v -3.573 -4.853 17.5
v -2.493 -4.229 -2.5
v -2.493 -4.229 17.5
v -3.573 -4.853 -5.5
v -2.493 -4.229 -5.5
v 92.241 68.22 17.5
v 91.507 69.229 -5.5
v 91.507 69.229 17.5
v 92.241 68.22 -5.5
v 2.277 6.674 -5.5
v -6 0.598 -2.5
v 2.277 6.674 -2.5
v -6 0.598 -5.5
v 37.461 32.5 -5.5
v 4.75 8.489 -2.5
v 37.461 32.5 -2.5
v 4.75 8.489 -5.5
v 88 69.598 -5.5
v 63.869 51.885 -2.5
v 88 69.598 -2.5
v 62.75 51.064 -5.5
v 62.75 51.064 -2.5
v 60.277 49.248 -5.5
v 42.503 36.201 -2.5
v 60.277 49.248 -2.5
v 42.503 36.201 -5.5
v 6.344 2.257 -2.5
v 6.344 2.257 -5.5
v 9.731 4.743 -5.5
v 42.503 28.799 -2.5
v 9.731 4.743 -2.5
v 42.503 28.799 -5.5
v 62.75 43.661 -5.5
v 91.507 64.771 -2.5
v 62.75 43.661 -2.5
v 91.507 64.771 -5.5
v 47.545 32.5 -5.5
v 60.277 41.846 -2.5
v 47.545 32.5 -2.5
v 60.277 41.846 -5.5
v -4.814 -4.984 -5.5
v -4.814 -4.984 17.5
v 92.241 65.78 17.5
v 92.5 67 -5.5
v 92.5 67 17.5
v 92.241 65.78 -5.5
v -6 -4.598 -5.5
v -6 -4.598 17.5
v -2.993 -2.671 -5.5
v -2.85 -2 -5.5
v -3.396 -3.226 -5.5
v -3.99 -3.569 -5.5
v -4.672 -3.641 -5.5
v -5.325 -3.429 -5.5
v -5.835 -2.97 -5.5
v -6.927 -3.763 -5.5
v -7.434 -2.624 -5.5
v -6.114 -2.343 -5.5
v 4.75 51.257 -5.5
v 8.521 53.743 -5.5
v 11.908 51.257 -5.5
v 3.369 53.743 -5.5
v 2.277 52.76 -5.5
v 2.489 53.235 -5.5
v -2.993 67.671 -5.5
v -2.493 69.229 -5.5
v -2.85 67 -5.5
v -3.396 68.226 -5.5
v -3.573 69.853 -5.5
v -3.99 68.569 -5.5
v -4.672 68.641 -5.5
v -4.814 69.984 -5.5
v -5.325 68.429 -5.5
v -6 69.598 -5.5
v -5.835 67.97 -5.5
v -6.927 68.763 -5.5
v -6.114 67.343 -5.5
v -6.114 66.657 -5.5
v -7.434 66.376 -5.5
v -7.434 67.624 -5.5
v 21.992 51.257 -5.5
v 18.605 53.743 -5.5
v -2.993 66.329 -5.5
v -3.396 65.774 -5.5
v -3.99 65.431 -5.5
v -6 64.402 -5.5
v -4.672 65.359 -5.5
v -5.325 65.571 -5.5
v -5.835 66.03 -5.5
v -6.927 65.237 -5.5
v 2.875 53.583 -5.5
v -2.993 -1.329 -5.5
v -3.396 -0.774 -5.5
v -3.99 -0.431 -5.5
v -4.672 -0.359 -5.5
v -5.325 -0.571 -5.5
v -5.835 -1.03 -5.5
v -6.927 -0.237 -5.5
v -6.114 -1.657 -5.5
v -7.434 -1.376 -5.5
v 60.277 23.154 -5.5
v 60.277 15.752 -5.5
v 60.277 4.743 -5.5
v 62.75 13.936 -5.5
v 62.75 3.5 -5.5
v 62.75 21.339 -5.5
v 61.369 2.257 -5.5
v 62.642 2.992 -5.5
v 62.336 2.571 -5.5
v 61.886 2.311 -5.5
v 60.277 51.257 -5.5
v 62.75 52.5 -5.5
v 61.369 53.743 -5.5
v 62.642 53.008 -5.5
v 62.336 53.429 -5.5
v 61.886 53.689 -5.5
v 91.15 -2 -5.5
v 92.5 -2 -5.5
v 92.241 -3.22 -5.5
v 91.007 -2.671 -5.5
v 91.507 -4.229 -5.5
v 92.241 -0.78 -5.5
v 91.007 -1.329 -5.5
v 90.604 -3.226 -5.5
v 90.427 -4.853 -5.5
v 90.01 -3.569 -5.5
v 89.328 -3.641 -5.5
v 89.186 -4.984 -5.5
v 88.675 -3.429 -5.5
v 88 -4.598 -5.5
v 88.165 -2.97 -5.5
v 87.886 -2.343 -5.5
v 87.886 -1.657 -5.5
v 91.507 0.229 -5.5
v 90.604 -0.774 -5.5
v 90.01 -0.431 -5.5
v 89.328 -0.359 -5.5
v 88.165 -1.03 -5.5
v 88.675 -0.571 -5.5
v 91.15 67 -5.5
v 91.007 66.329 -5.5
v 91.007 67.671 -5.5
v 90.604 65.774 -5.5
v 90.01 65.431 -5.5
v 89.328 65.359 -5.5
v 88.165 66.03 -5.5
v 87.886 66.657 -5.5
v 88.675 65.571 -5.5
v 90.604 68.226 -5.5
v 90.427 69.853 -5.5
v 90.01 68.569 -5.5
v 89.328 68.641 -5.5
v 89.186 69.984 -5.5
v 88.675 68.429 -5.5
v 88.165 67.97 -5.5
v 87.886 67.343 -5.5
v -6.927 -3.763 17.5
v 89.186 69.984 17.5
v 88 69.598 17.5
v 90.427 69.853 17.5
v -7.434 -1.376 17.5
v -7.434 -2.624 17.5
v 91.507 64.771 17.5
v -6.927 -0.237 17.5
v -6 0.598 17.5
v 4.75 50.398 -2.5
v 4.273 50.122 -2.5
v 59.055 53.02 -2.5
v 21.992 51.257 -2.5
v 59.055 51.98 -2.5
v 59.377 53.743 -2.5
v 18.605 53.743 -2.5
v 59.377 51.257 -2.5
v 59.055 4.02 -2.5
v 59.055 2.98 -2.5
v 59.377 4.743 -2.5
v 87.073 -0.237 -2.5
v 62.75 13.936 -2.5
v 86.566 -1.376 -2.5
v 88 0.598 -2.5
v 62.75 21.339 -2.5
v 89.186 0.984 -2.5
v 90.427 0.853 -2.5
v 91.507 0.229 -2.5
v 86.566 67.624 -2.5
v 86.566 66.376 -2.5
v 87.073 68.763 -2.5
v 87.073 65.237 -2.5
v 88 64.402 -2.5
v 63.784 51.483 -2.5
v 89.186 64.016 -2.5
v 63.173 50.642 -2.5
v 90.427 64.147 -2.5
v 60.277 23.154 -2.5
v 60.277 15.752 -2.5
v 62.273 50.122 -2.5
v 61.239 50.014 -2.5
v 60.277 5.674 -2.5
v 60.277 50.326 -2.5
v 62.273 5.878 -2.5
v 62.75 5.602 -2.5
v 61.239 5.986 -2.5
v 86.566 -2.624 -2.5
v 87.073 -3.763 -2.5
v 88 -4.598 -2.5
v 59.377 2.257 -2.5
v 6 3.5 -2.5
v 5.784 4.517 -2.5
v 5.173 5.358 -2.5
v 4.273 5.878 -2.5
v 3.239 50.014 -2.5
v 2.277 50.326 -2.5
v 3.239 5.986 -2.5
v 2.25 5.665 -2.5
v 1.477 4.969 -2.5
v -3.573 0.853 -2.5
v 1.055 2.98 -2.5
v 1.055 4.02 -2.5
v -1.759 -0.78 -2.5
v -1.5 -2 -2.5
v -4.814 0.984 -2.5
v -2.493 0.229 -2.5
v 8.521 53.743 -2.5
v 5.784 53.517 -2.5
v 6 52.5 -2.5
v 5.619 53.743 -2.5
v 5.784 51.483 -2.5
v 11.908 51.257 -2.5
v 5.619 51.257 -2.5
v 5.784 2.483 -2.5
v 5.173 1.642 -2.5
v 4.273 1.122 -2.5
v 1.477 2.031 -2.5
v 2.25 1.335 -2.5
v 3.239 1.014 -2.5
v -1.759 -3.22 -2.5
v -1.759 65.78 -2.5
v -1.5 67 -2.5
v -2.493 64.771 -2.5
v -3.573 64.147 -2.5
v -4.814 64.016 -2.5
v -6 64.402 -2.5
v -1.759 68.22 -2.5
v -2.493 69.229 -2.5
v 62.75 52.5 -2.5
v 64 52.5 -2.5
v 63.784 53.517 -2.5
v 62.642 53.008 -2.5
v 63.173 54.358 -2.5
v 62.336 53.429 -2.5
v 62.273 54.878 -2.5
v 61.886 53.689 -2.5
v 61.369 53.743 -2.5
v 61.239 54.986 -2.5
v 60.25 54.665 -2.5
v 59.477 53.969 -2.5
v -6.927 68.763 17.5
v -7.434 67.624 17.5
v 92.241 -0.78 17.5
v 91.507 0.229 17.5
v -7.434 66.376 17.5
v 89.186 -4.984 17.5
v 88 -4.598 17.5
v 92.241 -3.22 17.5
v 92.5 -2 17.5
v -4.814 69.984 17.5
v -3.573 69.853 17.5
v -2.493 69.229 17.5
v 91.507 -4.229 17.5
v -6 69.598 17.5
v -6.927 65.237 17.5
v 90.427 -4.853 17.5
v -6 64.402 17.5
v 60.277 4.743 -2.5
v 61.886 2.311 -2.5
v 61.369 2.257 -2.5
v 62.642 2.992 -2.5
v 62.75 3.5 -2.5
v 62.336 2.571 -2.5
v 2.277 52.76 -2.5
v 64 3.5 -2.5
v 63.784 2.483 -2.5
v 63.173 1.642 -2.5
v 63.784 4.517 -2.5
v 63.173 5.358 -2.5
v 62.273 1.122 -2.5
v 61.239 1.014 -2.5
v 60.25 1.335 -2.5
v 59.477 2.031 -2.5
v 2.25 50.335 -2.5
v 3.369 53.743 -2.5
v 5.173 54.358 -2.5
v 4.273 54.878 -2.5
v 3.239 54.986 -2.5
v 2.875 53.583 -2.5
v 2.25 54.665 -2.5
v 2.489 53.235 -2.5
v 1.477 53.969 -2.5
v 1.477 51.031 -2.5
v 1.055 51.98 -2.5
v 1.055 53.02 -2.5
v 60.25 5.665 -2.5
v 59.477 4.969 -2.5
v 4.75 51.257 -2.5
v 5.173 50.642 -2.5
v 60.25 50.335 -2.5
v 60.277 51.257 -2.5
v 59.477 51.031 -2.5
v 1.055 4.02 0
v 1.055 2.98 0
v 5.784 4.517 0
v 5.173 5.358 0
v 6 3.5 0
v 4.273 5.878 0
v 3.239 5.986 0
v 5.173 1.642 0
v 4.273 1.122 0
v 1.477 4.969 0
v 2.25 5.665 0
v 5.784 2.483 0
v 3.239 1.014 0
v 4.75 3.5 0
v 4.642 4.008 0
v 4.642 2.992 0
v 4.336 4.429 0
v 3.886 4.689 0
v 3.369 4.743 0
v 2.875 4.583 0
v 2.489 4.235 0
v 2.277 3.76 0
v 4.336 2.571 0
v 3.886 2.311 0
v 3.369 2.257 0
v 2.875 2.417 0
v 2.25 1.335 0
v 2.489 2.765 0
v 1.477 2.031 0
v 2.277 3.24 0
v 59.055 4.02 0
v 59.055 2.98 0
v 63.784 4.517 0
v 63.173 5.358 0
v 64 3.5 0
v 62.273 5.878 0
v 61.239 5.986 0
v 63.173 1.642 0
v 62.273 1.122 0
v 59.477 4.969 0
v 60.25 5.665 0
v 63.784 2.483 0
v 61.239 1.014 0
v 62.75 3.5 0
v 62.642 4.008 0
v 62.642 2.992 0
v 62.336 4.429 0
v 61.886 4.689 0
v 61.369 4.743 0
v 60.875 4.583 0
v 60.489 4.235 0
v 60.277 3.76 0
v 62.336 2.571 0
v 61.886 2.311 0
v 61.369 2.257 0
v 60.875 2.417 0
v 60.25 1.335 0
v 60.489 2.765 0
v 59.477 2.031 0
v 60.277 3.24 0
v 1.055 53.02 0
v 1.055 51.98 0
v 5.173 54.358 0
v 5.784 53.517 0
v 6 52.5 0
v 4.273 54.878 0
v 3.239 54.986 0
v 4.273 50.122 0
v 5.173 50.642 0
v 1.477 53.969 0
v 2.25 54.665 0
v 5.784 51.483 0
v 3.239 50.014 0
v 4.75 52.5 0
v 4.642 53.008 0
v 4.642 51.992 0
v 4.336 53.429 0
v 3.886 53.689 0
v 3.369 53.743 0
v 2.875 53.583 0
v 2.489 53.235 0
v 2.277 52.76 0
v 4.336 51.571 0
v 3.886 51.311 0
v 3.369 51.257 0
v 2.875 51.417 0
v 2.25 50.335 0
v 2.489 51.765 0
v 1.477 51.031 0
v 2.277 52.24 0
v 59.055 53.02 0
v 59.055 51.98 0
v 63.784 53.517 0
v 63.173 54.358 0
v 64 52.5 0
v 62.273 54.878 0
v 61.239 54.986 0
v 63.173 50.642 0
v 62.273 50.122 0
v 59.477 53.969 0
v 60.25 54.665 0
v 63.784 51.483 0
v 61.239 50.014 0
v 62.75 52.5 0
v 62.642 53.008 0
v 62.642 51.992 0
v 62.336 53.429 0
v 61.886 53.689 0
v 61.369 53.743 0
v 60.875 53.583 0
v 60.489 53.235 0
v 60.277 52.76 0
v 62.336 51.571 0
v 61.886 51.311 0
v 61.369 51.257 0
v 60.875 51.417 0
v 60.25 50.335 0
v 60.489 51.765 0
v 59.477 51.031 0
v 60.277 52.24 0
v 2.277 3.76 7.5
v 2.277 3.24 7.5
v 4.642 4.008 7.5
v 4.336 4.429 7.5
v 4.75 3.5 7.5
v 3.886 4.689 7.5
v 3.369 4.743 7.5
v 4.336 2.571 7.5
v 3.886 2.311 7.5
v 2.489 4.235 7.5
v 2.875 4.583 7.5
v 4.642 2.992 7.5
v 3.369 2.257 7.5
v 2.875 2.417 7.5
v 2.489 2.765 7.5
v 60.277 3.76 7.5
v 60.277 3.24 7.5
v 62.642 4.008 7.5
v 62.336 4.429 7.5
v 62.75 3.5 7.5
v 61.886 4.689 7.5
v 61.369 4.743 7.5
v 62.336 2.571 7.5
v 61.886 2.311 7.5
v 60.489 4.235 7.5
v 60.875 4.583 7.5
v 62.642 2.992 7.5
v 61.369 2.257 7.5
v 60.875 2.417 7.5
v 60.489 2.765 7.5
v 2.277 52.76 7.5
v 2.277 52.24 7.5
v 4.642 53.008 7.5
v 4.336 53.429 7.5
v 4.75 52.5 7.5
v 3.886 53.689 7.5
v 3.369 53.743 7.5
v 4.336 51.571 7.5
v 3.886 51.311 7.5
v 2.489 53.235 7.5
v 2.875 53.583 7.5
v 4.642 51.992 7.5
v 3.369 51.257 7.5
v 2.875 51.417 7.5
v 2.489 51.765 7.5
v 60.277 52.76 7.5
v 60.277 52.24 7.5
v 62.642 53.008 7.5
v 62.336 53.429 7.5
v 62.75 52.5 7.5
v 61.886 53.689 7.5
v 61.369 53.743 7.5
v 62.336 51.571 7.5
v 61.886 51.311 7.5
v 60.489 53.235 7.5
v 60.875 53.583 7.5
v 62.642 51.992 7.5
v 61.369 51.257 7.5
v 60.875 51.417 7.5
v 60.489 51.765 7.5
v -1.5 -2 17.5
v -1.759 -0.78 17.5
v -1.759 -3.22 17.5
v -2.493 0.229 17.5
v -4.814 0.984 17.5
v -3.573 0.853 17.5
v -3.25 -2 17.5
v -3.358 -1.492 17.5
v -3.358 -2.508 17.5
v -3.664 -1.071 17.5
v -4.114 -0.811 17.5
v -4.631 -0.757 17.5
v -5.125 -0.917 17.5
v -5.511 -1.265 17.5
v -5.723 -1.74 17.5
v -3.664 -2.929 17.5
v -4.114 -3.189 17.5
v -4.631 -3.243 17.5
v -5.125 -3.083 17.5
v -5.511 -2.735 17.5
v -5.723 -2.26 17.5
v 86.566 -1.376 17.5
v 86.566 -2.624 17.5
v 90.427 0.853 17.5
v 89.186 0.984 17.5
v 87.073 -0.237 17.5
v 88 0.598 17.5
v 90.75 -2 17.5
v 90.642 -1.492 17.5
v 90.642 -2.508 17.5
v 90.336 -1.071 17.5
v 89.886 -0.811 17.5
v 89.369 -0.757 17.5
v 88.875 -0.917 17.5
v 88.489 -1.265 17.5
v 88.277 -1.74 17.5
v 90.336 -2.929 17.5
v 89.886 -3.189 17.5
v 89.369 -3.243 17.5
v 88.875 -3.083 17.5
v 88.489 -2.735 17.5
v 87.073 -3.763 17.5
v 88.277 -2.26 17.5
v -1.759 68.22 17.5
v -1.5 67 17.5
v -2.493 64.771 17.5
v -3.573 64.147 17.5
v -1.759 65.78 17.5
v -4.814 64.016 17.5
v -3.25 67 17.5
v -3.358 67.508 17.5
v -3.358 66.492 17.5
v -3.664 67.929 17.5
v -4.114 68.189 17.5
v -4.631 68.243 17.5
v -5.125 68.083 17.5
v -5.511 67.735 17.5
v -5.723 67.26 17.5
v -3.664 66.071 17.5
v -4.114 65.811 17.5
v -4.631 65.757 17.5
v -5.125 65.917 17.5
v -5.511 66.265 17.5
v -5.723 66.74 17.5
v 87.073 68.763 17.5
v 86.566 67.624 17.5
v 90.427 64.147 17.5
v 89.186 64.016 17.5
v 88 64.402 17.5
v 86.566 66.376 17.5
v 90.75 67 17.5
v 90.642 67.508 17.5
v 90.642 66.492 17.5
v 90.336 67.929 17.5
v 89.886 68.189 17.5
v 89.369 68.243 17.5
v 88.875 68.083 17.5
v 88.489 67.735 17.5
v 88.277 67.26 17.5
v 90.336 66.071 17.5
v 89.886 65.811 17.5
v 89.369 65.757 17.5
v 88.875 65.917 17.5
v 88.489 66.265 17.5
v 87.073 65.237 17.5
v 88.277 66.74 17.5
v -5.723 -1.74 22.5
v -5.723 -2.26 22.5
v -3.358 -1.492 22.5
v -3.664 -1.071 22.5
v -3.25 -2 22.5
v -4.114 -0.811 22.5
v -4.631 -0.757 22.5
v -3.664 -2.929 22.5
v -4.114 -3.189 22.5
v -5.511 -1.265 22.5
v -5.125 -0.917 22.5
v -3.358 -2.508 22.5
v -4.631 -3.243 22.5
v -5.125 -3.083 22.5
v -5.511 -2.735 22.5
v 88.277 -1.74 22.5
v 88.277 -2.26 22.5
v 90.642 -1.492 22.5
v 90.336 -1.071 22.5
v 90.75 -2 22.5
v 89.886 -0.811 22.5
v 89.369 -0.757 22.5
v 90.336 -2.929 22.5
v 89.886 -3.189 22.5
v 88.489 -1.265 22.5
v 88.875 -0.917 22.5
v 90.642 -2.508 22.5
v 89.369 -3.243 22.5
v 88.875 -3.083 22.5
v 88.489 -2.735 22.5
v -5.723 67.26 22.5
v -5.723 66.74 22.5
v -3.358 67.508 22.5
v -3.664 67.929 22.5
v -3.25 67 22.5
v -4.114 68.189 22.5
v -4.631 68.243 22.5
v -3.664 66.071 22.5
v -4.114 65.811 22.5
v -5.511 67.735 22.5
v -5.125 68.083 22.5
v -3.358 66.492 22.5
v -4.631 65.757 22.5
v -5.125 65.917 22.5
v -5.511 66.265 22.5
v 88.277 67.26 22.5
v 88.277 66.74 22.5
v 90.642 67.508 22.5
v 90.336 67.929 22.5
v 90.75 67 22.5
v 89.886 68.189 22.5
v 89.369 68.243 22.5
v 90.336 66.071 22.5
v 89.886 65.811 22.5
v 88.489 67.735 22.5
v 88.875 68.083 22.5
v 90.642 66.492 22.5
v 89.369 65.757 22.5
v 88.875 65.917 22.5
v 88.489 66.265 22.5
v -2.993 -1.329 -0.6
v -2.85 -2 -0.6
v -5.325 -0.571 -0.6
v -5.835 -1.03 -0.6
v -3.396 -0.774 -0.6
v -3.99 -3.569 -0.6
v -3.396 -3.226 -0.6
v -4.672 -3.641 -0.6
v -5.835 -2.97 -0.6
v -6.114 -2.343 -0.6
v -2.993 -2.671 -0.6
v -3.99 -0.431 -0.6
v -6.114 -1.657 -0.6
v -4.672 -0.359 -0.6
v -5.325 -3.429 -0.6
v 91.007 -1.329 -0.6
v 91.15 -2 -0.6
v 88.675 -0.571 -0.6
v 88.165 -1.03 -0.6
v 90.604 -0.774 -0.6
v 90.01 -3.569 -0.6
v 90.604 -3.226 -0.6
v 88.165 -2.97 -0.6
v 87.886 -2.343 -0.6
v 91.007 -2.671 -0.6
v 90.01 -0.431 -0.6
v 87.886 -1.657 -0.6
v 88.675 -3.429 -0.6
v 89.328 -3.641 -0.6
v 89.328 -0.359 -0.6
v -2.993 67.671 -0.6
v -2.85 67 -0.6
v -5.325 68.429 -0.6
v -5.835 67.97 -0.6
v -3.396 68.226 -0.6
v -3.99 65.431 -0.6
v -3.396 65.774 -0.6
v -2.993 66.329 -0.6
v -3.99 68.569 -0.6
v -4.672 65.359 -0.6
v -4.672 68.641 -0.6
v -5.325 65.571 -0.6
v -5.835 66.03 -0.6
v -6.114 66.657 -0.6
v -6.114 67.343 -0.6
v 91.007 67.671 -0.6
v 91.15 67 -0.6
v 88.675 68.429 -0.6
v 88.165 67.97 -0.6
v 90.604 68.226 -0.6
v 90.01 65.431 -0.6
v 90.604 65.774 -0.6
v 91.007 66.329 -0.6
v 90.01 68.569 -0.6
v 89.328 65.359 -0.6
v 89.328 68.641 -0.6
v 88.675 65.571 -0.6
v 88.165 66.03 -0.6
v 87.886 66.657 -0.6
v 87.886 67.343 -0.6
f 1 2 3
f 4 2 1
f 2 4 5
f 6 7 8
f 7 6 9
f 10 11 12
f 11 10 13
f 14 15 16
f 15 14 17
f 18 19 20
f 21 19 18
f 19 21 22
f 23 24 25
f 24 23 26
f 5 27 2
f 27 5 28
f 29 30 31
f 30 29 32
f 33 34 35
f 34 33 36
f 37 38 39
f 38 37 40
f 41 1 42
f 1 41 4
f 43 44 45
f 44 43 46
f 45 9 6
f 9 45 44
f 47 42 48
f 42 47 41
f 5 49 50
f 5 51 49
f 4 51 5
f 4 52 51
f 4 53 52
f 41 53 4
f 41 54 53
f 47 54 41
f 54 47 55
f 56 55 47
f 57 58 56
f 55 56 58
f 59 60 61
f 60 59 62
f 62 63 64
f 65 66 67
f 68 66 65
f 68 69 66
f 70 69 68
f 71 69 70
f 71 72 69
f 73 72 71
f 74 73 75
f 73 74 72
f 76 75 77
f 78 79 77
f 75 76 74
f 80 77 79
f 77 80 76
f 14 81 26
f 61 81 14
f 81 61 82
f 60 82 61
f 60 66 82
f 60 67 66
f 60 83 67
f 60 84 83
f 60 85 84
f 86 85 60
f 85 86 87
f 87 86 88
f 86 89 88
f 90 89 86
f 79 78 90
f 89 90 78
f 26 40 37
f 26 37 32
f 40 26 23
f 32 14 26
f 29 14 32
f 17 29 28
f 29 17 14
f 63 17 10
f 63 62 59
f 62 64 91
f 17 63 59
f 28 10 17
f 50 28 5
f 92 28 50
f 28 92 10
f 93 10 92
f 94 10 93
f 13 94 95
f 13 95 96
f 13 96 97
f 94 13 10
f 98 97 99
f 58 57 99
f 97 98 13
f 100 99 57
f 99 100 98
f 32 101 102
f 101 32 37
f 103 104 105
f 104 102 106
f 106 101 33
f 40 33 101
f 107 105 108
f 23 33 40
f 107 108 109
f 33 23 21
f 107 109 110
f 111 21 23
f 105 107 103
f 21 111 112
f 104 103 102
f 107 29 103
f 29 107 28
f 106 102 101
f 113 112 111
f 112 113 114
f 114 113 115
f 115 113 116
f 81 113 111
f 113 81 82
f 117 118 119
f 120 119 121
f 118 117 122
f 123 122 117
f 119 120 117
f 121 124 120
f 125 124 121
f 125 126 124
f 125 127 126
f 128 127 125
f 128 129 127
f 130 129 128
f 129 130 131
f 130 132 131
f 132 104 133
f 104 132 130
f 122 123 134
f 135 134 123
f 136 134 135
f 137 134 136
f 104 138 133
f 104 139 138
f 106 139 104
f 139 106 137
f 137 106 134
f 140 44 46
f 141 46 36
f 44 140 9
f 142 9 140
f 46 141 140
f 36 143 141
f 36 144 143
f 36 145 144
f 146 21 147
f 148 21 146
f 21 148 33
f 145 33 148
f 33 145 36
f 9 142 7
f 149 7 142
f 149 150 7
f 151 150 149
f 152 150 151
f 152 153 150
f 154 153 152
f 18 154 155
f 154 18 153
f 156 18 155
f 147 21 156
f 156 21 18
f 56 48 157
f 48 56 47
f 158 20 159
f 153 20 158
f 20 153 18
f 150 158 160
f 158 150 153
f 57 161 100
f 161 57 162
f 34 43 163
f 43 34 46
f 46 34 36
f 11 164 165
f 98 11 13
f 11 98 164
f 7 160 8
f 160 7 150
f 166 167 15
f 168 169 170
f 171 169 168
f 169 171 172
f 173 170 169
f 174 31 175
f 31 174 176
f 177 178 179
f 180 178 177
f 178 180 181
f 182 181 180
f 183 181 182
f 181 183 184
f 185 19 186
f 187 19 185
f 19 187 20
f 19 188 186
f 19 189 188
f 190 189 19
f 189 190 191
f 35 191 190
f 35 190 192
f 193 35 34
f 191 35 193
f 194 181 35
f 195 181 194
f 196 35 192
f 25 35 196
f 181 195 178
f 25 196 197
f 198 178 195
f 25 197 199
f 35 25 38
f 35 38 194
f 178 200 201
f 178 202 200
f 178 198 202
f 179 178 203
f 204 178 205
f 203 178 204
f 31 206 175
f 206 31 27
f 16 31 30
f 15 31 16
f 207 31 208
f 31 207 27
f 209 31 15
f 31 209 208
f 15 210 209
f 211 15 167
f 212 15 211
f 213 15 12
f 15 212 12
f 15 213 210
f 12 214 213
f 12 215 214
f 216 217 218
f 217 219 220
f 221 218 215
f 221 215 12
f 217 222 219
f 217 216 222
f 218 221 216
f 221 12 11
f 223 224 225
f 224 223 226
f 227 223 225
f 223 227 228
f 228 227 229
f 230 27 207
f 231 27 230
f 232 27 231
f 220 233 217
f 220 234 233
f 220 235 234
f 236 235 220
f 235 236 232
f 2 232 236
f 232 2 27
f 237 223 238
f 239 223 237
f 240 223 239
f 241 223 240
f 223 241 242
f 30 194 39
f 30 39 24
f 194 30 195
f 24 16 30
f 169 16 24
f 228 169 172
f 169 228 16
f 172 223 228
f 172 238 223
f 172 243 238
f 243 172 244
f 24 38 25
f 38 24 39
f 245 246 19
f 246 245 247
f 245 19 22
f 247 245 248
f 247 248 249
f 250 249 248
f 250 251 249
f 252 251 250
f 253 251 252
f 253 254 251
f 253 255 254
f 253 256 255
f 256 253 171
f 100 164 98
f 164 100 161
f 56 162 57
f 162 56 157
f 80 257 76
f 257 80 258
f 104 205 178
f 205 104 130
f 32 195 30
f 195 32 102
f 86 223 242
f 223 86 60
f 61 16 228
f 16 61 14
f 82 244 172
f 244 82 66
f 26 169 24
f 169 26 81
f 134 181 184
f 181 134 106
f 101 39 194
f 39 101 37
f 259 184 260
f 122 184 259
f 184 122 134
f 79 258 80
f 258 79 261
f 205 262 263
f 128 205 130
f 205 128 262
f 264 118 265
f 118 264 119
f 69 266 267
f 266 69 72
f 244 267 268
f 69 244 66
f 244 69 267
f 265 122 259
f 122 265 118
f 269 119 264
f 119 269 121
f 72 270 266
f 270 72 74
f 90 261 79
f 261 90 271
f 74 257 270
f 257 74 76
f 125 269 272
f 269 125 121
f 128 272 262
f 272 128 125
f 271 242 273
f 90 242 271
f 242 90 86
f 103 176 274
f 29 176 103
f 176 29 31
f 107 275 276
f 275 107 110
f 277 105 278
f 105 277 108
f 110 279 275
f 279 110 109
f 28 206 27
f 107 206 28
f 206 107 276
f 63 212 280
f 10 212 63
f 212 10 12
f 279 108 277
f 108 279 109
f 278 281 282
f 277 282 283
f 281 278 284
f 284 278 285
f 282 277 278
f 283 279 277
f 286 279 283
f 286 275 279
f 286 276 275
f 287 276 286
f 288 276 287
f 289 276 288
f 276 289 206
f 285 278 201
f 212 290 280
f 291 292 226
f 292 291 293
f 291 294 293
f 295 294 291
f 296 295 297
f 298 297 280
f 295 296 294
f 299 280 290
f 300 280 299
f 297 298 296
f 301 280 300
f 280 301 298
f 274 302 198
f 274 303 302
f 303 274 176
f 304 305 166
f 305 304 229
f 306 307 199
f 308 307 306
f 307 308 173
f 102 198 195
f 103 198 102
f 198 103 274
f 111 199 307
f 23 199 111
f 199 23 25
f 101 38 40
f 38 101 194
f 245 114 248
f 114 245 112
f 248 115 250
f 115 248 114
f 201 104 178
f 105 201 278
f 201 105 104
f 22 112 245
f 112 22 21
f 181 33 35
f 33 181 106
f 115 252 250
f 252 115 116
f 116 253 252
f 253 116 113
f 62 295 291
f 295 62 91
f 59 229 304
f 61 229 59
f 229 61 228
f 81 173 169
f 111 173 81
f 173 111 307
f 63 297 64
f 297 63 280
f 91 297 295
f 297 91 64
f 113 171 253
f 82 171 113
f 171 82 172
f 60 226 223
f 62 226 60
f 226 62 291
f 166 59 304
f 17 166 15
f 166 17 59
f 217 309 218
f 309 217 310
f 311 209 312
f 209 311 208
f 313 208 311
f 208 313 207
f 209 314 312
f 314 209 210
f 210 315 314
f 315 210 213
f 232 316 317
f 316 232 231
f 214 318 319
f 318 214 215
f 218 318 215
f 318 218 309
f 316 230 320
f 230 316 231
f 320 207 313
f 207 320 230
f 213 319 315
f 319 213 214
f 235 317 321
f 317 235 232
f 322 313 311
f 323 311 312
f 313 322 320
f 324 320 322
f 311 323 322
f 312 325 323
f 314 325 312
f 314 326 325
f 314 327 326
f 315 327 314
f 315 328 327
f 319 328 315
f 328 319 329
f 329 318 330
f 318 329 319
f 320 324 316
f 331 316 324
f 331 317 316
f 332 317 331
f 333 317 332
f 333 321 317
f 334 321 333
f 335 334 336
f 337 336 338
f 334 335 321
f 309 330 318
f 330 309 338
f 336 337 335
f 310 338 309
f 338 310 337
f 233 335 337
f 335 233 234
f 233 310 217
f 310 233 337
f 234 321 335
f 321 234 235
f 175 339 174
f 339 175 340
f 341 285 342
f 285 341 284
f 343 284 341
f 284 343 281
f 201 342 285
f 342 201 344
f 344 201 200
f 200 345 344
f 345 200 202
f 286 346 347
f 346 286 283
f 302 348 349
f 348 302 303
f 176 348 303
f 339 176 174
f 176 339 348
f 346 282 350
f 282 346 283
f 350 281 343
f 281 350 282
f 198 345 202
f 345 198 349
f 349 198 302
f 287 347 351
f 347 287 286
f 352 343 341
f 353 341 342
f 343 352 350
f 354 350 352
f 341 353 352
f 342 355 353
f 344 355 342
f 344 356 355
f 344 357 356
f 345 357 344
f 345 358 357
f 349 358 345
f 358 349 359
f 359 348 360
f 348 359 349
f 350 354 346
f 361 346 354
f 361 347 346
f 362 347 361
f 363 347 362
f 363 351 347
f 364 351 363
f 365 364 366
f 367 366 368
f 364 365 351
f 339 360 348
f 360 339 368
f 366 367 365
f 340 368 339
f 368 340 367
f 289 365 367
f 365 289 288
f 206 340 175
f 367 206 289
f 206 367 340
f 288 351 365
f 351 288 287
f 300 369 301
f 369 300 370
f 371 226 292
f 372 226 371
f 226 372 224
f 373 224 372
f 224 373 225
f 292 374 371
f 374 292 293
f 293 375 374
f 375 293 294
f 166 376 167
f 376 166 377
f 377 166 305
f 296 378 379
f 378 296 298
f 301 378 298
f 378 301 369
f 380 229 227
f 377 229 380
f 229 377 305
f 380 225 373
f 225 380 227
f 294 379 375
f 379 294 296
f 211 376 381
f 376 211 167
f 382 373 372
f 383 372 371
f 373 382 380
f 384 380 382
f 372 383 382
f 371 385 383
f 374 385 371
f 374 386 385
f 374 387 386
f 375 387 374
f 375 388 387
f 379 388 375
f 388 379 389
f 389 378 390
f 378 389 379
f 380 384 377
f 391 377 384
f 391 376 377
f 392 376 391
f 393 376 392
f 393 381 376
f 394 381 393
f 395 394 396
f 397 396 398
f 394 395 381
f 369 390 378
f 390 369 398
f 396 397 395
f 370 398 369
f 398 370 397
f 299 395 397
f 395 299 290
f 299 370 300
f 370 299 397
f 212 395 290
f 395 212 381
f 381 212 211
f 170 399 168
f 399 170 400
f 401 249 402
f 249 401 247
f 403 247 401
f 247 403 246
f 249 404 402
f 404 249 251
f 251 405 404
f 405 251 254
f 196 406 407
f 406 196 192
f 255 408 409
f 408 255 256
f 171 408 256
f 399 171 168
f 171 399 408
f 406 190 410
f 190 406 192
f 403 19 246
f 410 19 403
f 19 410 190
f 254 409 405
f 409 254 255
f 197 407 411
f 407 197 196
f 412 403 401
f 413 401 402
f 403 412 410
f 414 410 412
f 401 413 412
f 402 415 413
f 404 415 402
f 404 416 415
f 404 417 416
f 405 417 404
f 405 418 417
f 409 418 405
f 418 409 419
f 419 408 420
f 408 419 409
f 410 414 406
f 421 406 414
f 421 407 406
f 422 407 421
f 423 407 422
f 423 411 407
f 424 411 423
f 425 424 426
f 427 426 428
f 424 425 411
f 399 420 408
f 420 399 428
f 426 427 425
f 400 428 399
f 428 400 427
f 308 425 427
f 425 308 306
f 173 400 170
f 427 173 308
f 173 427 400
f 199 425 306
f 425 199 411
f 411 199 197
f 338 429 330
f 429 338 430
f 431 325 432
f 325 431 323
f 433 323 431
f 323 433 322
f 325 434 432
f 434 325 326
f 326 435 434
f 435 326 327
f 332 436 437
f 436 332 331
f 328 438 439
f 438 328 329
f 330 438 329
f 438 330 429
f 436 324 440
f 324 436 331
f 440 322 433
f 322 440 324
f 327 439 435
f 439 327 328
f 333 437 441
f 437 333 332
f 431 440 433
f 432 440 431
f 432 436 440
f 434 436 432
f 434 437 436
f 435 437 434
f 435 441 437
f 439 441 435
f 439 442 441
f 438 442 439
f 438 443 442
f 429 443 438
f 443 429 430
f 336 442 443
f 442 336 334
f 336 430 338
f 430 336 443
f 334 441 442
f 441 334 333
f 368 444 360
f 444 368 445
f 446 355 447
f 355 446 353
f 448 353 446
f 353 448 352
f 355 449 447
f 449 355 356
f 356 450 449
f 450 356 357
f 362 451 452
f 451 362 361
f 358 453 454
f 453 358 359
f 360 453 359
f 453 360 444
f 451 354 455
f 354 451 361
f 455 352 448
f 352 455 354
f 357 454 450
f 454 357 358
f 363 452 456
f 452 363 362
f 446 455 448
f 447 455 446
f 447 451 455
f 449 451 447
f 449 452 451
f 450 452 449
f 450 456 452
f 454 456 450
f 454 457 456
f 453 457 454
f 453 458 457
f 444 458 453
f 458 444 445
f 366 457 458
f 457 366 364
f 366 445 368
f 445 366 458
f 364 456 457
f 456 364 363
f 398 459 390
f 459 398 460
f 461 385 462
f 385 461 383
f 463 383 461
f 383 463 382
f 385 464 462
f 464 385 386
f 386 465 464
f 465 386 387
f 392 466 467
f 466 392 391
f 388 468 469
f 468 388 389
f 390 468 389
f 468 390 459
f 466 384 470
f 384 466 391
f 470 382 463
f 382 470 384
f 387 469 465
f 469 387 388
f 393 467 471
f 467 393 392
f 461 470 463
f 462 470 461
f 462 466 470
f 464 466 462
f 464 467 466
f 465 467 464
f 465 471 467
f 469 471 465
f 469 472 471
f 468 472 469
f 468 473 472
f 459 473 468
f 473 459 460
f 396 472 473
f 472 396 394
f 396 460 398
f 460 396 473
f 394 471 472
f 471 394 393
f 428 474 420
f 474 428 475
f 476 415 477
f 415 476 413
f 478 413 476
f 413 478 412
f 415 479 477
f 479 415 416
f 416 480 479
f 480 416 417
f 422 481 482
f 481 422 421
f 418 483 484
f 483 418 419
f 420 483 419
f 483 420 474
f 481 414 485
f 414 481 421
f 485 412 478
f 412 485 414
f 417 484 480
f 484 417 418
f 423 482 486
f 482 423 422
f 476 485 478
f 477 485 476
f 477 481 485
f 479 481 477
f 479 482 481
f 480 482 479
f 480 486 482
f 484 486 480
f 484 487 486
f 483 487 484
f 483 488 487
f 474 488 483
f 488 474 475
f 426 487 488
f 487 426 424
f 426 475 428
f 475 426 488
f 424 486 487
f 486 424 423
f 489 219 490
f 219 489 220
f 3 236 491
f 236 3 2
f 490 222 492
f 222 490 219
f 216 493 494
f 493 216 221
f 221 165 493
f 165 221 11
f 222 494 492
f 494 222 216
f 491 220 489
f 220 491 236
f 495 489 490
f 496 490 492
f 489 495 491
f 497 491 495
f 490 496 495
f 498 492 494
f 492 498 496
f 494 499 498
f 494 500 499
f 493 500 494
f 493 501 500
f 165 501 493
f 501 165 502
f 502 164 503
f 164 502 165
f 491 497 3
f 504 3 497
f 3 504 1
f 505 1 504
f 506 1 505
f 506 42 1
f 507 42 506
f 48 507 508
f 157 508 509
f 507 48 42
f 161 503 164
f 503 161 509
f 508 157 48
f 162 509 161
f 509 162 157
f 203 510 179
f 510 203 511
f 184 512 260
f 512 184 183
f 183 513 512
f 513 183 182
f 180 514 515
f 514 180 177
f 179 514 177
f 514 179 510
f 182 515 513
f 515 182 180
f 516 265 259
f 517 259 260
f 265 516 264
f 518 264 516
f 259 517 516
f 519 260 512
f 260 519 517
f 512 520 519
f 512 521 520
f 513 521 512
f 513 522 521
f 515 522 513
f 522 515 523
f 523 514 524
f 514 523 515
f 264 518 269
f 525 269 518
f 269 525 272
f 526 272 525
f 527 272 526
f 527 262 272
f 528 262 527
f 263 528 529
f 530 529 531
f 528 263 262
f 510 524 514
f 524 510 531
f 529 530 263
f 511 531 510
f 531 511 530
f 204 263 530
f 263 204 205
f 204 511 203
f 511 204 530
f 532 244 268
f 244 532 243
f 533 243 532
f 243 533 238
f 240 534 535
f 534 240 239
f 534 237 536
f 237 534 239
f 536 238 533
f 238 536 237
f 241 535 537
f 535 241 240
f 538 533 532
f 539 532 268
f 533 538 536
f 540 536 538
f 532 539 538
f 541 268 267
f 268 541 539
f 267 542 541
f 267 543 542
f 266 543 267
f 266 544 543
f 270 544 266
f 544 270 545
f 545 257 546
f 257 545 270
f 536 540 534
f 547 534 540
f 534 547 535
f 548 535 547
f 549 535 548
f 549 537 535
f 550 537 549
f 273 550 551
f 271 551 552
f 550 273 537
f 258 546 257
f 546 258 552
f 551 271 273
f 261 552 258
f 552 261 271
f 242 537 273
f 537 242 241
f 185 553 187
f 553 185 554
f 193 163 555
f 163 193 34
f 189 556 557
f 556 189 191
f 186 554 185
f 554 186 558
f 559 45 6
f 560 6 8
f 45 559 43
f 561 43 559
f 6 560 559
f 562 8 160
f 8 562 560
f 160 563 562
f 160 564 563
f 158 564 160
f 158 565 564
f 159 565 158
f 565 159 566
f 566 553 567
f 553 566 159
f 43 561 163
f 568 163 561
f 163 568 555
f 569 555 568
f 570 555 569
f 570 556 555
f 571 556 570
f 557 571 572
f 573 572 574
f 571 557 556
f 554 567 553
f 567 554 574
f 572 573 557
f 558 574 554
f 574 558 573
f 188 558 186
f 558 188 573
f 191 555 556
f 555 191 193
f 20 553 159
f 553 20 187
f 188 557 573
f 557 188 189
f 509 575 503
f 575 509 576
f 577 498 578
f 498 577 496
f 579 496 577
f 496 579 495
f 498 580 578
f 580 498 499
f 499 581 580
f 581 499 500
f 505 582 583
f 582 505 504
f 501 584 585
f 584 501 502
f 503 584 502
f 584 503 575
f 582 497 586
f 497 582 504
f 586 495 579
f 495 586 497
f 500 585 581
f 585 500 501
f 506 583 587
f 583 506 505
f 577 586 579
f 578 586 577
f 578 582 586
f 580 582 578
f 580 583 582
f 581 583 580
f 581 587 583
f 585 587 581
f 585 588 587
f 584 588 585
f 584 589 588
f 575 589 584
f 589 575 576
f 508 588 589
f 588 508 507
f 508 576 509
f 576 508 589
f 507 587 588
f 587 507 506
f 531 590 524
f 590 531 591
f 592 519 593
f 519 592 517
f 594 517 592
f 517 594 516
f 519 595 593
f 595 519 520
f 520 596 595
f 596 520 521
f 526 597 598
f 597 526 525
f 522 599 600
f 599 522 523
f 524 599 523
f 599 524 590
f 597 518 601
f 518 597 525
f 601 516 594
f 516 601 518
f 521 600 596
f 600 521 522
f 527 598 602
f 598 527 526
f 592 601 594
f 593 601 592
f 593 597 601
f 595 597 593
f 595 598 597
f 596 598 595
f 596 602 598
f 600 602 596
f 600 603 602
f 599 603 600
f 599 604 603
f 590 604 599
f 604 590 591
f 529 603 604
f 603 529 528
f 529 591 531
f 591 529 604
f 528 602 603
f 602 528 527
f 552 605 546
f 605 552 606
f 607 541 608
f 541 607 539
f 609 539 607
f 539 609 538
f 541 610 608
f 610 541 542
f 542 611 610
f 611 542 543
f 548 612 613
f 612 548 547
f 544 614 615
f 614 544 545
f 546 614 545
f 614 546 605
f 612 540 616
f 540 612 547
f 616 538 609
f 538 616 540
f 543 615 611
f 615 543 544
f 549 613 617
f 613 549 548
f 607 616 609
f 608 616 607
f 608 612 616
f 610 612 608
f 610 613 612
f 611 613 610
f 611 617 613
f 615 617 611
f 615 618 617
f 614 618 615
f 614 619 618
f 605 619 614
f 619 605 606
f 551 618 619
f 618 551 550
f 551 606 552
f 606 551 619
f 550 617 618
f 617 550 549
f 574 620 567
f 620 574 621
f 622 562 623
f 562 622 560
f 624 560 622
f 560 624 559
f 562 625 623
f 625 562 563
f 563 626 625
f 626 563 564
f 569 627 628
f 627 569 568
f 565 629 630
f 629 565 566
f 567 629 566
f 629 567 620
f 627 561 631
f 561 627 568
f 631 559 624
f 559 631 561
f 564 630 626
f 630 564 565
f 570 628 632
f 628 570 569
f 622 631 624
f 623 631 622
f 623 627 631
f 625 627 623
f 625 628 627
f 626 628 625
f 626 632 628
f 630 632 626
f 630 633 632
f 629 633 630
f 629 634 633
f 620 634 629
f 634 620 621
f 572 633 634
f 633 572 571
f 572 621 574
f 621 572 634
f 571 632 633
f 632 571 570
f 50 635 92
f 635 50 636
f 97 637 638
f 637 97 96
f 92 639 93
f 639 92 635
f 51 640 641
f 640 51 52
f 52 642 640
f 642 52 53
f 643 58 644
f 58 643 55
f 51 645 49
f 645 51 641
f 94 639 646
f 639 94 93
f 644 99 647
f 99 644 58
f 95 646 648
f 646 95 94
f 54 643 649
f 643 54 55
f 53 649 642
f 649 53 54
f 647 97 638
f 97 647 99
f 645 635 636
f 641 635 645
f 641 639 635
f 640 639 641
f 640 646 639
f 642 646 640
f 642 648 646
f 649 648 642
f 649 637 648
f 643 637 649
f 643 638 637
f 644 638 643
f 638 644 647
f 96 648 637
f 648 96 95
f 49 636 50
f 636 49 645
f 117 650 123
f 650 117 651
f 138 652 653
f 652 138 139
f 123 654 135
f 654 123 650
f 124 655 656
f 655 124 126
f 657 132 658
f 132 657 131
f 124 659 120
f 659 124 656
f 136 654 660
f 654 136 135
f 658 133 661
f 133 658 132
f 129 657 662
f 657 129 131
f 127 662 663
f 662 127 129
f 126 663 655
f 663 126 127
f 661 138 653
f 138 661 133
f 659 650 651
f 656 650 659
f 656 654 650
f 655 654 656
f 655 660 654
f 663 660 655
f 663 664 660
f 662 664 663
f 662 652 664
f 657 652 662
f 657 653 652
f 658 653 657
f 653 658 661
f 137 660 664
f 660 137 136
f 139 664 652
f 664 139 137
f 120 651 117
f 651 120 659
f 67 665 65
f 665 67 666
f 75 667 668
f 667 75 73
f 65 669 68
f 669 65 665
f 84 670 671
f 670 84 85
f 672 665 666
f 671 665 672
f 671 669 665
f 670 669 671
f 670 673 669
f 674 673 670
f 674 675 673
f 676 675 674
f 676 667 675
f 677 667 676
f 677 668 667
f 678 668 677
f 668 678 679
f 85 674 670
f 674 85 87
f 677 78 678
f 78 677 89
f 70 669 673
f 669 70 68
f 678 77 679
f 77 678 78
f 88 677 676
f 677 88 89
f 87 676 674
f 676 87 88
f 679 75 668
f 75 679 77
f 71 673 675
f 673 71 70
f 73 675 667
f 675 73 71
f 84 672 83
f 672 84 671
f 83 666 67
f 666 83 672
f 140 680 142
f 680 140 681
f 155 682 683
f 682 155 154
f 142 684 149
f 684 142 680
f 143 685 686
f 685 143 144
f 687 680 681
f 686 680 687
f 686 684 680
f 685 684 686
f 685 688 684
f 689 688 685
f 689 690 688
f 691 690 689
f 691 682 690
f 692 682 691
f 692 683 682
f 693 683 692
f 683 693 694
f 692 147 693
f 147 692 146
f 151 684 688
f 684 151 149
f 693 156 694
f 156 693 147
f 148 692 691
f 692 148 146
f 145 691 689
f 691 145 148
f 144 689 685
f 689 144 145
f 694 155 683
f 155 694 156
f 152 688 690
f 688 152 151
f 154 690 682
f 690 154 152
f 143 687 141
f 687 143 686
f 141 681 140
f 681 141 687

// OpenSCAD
// pi-like-stack
// Stack pi-like boards on top of one another
// 85mm x 56mm x 20mm
// Standoffs 2.5mm diameter

// BUG (openscad): https://github.com/openscad/openscad/issues/3098
// Customizer has poor support for float input.
// Workaround: ``my_parameter = 1.0 // .01``
// Or:  ``my_parameter = 1.0 // [0:0.1:2]``
// See: "Unavailable customizations"
// https://en.wikibooks.org/wiki/OpenSCAD_User_Manual/Customizer

// ----------------------------------------
// Parameters
// ----------------------------------------

$fn=15;

colour_a = [0.999, 0.999, 0.999];
colour_b = [0.42, 0.81, 0.39];

// Toggle board visiblity
board_enabled = true;

// Toggle case pillar connectors
case_minimal_enabled = true;
// Toggle case standoff connectors
case_board_connect_enabled = true;
// Toggle case slab
case_slab_enabled = false;
// Toggle hex air hole in case slab
case_slab_holes = false;

// Toggle standoff 1
standoff_1_enabled = true;
// Toggle standoff 2
standoff_2_enabled = true;
// Toggle standoff 3
standoff_3_enabled = true;
// Toggle standoff 4
standoff_4_enabled = true;

// Toggle pillars
pillars_enabled = true;

/* [Board] */

// Standard size pi-like
board_size = [85.0, 65.0, 20.0];
board_n=1;
// Half size pi-like
//board_size = [30, 65, 20];
// Duplicate board in X
//board_n=2;
// Board roundness
board_r = 3.0;  // .01

// Duplicate board gap
board_n_space = 10.0;  // .01

/* [Standoffs] */

// Standard size pi-like
// Standoff distance in X
standoff_x = 58.0;  // .01
// Standoff distance in Y
standoff_y = 49.0;  // .01

// Half size pi-like
//standoff_x = 23;  // .01
// Standoff distance in Y
//standoff_y = 58;  // .01

// Standoff height
standoff_z = 10.0;  // .01
// Standoff radius
standoff_r = 1.25;  // .01
// Standoff base radius
standoff_base_r = 2.5;  // .01
// Standoff base height
standoff_base_z = 2.5;  // .01
// Standoff distance from origin in X
standoff_offset_x = 3.5;  // .01
// Standoff distance from origin in Y
standoff_offset_y = 3.5;  // .01

/* [Case] */

// Case size in X
case_x = 100.0;  // .01
// Case size in Y
case_y = 75.0;  // .01
// Case thickness
case_z = 3.0;  // .01
// Case corner roundness
case_r = 3.0;  // .01
// Scale the air hole pattern if case slab and holes enabled
case_slab_hole_scale = 1.025;  // .01
case_slab_hole_offset = 1.0;  // .01


/* [Case pillars] */

pillar_h = 25.0;  // .01
pillar_r = 3.0;  // .01
pillar_offset_x = 6.0;  // .01
pillar_offset_y = 6.0;  // .01
pillar_dowel_h = 5.0;  // .01
pillar_dowel_r = 1.25;  // .01


// ----------------------------------------
// Utilities
// ----------------------------------------

module cube_round(
    size=[1,1,1],
    r=0.25,
    center=false,
    hull=true,
    corners=[true, true, true, true]
) {
    module _corners(){
        if(corners[0]){
            translate([r, r, 0])
            cylinder(h=size[2], r=r, center=false);
        }
        if(corners[1]){
            translate([size[0]-2*r, 0, 0])
            translate([r, r, 0])
            cylinder(h=size[2], r=r, center=false);
        }
        if(corners[2]){
            translate([0, size[1]-2*r, 0])
            translate([r, r, 0])
            cylinder(h=size[2], r=r, center=false);
        }
        if(corners[3]){
            translate([size[0]-2*r, size[1]-2*r, 0])
            translate([r, r, 0])
            cylinder(h=size[2], r=r, center=false);
        }
    }
    if (hull){
        hull()
            _corners();
    } else {
        _corners();
    }
}

module pillars(
    size=[1,1,1],
    r=0.25,
    center=false,
    size_from_pillar=false,
    corners=[true, true, true, true],
    hull=false
){
    d = r * 2;
    _size = size_from_pillar ? [size[0]+d, size[1]+d, size[2]]: size;
    _translate = size_from_pillar ? [-r, -r, 0] : [0, 0, 0];
    translate(_translate){
        cube_round(
            size=_size,
            r=r,
            center=center,
            corners=corners,
            hull=hull
        );
    }
}

// ----------------------------------------
// Components
// ----------------------------------------

module board(size=board_size, r=board_r){
    % color(colour_b, 0.5) cube_round([size[0], size[1], 1.5], r=max(r, 0.1));
}

module standoffs(
    size=[standoff_x, standoff_y, standoff_z],
    r=standoff_r,
    r2=standoff_base_r,
    z2=standoff_base_z,
    size_from_pillar=true,
    offset=[standoff_offset_x, standoff_offset_y, 0],
    corners=[
        standoff_1_enabled,
        standoff_2_enabled,
        standoff_3_enabled,
        standoff_4_enabled
    ],
    hull=false,
    base=true,
){
    translate(offset){
        if(base){
            // base for board to sit on
            pillars(
                size=[size[0], size[1], z2],
                r=r2,
                size_from_pillar=size_from_pillar,
                corners=corners,
                hull=hull
            );
        }
        // main pillar
        pillars(
            size=size,
            r=r,
            size_from_pillar=size_from_pillar,
            corners=corners,
            hull=hull
        );
    }
}

module case_slab(
    size=[case_x, case_y, case_z],
    r=case_r,
    offset=[
        -(case_x - board_size[0]*board_n)/2 + board_n_space/2*(board_n-1),
        -(case_y - board_size[1])/2,
        -case_z
    ]
){
    // Main base
    translate(offset){
        cube_round(size, r=r);
    }
}

module case_minimal(
    size=[case_x, case_y, case_z],
    r=case_r,
    offset=[-(case_x - board_size[0]*board_n)/2 + board_n_space/2*(board_n-1), -(case_y - board_size[1])/2, -case_z]
){
    // Main Base
    translate(offset){
        cube_round(size, r=r, hull=true, corners=[true, false, false, true]);
        cube_round(size, r=r, hull=true, corners=[false, true, true, false]);
    }
}
module case_minimal_standoffs(
    size=[case_x, case_y, case_z],
    r=case_r,
    offset=[-(case_x - board_size[0]*board_n)/2, -(case_y - board_size[1])/2, -case_z]
){
    translate([0, 0, -case_z]){
        standoffs( size=[standoff_x, standoff_y, case_z], corners=[true, true, false, false], hull=true, base=false);
        standoffs( size=[standoff_x, standoff_y, case_z], corners=[false, true, false, true], hull=true, base=false);
        standoffs( size=[standoff_x, standoff_y, case_z], corners=[false, false, true, true], hull=true, base=false);
        standoffs( size=[standoff_x, standoff_y, case_z], corners=[true, false, true, false], hull=true, base=false);
    }
}

module case_pillars(
    size=[
        case_x - pillar_r * 2,
        case_y - pillar_r * 2,
        case_z + board_size[2]
    ],
    r=pillar_r,
    offset=[
        -(case_x - board_size[0]*board_n)/2+pillar_r + board_n_space/2*(board_n-1),
        -(case_y - board_size[1])/2+pillar_r,
        -case_z
    ],
    h2=pillar_dowel_h,
    r2=pillar_dowel_r
){
    translate(offset){
        // Pillar main
        pillars(size=size, r=r, size_from_pillar=true);
        // Pillar dowel
        pillars(size=[size[0], size[1], size[2] + h2], r=r2, size_from_pillar=true);
    }
}

module case_pillar_holes(
    size=[ 
        case_x - pillar_r * 2,
        case_y - pillar_r * 2,
        case_z + board_size[2]
    ],
    r=pillar_r,
    offset=[
        -(case_x - board_size[0]*board_n) / 2 + pillar_r + board_n_space/2*(board_n-1),
        -(case_y - board_size[1]) / 2 + pillar_r,
        -case_z + -0.1
    ]
){
    translate(offset){
        pillars(
            size=[
                size[0],
                size[1],
                pillar_dowel_h
            ],
            r=pillar_dowel_r + 0.4,
            size_from_pillar=true
        );
    } 
}

module case_vents(
    size=[case_x, case_y, case_z],
    offset=[
        -(case_x - board_size[0]*board_n)/2 + board_n_space/2*(board_n-1) + case_slab_hole_offset,
        -(case_y - board_size[1])/2,
        -case_z
    ],
    r=case_z*3/2,
    s=case_slab_hole_scale
){
    scale([s,s,1]){
        translate(offset){
            for(i=[0:size[2]*5:size[0]*2]){
                for(j=[0:size[2]*3.25:size[1]*2]){
                    translate([i+size[2]*2.5,j+size[2]+1.5,-size[2]])
                    cylinder(d=r*2,h=size[2] * 3, $fn=6);
                translate([i,j,-size[2]])
                    cylinder(d=r*2,h=size[2] * 3, $fn=6);
                }
            }
        }
    }
}

// ----------------------------------------
// Assembly / Main
// Ran if     : ``include <filename>``
// Skipped if : ``use <filename>``
// ----------------------------------------

module main(){
    // Board
    for(i=[0:1:board_n-1]){
        translate([i * (board_size[0] + board_n_space), 0, 0]){
            if(board_enabled){ board();}
        }
    }

    // Case
    translate([0,0,-standoff_base_z]){
        color(colour_a){
            difference(){
                union(){
                    if(case_slab_enabled){
                        difference(){
                            case_slab();
                            if(case_slab_holes){
                                difference(){
                                    case_vents();
                                    case_pillars();
                                }
                            }
                        }
                    }
                    if(case_minimal_enabled){case_minimal();}
                    for(i=[0:1:board_n-1]){
                        translate([i * (board_size[0] + board_n_space), 0, 0]){
                            if(case_board_connect_enabled){case_minimal_standoffs();}
                            standoffs();
                        }
                    }
                    if(pillars_enabled){case_pillars();}
                }
                case_pillar_holes();
            }
        }
    }
}

main();
